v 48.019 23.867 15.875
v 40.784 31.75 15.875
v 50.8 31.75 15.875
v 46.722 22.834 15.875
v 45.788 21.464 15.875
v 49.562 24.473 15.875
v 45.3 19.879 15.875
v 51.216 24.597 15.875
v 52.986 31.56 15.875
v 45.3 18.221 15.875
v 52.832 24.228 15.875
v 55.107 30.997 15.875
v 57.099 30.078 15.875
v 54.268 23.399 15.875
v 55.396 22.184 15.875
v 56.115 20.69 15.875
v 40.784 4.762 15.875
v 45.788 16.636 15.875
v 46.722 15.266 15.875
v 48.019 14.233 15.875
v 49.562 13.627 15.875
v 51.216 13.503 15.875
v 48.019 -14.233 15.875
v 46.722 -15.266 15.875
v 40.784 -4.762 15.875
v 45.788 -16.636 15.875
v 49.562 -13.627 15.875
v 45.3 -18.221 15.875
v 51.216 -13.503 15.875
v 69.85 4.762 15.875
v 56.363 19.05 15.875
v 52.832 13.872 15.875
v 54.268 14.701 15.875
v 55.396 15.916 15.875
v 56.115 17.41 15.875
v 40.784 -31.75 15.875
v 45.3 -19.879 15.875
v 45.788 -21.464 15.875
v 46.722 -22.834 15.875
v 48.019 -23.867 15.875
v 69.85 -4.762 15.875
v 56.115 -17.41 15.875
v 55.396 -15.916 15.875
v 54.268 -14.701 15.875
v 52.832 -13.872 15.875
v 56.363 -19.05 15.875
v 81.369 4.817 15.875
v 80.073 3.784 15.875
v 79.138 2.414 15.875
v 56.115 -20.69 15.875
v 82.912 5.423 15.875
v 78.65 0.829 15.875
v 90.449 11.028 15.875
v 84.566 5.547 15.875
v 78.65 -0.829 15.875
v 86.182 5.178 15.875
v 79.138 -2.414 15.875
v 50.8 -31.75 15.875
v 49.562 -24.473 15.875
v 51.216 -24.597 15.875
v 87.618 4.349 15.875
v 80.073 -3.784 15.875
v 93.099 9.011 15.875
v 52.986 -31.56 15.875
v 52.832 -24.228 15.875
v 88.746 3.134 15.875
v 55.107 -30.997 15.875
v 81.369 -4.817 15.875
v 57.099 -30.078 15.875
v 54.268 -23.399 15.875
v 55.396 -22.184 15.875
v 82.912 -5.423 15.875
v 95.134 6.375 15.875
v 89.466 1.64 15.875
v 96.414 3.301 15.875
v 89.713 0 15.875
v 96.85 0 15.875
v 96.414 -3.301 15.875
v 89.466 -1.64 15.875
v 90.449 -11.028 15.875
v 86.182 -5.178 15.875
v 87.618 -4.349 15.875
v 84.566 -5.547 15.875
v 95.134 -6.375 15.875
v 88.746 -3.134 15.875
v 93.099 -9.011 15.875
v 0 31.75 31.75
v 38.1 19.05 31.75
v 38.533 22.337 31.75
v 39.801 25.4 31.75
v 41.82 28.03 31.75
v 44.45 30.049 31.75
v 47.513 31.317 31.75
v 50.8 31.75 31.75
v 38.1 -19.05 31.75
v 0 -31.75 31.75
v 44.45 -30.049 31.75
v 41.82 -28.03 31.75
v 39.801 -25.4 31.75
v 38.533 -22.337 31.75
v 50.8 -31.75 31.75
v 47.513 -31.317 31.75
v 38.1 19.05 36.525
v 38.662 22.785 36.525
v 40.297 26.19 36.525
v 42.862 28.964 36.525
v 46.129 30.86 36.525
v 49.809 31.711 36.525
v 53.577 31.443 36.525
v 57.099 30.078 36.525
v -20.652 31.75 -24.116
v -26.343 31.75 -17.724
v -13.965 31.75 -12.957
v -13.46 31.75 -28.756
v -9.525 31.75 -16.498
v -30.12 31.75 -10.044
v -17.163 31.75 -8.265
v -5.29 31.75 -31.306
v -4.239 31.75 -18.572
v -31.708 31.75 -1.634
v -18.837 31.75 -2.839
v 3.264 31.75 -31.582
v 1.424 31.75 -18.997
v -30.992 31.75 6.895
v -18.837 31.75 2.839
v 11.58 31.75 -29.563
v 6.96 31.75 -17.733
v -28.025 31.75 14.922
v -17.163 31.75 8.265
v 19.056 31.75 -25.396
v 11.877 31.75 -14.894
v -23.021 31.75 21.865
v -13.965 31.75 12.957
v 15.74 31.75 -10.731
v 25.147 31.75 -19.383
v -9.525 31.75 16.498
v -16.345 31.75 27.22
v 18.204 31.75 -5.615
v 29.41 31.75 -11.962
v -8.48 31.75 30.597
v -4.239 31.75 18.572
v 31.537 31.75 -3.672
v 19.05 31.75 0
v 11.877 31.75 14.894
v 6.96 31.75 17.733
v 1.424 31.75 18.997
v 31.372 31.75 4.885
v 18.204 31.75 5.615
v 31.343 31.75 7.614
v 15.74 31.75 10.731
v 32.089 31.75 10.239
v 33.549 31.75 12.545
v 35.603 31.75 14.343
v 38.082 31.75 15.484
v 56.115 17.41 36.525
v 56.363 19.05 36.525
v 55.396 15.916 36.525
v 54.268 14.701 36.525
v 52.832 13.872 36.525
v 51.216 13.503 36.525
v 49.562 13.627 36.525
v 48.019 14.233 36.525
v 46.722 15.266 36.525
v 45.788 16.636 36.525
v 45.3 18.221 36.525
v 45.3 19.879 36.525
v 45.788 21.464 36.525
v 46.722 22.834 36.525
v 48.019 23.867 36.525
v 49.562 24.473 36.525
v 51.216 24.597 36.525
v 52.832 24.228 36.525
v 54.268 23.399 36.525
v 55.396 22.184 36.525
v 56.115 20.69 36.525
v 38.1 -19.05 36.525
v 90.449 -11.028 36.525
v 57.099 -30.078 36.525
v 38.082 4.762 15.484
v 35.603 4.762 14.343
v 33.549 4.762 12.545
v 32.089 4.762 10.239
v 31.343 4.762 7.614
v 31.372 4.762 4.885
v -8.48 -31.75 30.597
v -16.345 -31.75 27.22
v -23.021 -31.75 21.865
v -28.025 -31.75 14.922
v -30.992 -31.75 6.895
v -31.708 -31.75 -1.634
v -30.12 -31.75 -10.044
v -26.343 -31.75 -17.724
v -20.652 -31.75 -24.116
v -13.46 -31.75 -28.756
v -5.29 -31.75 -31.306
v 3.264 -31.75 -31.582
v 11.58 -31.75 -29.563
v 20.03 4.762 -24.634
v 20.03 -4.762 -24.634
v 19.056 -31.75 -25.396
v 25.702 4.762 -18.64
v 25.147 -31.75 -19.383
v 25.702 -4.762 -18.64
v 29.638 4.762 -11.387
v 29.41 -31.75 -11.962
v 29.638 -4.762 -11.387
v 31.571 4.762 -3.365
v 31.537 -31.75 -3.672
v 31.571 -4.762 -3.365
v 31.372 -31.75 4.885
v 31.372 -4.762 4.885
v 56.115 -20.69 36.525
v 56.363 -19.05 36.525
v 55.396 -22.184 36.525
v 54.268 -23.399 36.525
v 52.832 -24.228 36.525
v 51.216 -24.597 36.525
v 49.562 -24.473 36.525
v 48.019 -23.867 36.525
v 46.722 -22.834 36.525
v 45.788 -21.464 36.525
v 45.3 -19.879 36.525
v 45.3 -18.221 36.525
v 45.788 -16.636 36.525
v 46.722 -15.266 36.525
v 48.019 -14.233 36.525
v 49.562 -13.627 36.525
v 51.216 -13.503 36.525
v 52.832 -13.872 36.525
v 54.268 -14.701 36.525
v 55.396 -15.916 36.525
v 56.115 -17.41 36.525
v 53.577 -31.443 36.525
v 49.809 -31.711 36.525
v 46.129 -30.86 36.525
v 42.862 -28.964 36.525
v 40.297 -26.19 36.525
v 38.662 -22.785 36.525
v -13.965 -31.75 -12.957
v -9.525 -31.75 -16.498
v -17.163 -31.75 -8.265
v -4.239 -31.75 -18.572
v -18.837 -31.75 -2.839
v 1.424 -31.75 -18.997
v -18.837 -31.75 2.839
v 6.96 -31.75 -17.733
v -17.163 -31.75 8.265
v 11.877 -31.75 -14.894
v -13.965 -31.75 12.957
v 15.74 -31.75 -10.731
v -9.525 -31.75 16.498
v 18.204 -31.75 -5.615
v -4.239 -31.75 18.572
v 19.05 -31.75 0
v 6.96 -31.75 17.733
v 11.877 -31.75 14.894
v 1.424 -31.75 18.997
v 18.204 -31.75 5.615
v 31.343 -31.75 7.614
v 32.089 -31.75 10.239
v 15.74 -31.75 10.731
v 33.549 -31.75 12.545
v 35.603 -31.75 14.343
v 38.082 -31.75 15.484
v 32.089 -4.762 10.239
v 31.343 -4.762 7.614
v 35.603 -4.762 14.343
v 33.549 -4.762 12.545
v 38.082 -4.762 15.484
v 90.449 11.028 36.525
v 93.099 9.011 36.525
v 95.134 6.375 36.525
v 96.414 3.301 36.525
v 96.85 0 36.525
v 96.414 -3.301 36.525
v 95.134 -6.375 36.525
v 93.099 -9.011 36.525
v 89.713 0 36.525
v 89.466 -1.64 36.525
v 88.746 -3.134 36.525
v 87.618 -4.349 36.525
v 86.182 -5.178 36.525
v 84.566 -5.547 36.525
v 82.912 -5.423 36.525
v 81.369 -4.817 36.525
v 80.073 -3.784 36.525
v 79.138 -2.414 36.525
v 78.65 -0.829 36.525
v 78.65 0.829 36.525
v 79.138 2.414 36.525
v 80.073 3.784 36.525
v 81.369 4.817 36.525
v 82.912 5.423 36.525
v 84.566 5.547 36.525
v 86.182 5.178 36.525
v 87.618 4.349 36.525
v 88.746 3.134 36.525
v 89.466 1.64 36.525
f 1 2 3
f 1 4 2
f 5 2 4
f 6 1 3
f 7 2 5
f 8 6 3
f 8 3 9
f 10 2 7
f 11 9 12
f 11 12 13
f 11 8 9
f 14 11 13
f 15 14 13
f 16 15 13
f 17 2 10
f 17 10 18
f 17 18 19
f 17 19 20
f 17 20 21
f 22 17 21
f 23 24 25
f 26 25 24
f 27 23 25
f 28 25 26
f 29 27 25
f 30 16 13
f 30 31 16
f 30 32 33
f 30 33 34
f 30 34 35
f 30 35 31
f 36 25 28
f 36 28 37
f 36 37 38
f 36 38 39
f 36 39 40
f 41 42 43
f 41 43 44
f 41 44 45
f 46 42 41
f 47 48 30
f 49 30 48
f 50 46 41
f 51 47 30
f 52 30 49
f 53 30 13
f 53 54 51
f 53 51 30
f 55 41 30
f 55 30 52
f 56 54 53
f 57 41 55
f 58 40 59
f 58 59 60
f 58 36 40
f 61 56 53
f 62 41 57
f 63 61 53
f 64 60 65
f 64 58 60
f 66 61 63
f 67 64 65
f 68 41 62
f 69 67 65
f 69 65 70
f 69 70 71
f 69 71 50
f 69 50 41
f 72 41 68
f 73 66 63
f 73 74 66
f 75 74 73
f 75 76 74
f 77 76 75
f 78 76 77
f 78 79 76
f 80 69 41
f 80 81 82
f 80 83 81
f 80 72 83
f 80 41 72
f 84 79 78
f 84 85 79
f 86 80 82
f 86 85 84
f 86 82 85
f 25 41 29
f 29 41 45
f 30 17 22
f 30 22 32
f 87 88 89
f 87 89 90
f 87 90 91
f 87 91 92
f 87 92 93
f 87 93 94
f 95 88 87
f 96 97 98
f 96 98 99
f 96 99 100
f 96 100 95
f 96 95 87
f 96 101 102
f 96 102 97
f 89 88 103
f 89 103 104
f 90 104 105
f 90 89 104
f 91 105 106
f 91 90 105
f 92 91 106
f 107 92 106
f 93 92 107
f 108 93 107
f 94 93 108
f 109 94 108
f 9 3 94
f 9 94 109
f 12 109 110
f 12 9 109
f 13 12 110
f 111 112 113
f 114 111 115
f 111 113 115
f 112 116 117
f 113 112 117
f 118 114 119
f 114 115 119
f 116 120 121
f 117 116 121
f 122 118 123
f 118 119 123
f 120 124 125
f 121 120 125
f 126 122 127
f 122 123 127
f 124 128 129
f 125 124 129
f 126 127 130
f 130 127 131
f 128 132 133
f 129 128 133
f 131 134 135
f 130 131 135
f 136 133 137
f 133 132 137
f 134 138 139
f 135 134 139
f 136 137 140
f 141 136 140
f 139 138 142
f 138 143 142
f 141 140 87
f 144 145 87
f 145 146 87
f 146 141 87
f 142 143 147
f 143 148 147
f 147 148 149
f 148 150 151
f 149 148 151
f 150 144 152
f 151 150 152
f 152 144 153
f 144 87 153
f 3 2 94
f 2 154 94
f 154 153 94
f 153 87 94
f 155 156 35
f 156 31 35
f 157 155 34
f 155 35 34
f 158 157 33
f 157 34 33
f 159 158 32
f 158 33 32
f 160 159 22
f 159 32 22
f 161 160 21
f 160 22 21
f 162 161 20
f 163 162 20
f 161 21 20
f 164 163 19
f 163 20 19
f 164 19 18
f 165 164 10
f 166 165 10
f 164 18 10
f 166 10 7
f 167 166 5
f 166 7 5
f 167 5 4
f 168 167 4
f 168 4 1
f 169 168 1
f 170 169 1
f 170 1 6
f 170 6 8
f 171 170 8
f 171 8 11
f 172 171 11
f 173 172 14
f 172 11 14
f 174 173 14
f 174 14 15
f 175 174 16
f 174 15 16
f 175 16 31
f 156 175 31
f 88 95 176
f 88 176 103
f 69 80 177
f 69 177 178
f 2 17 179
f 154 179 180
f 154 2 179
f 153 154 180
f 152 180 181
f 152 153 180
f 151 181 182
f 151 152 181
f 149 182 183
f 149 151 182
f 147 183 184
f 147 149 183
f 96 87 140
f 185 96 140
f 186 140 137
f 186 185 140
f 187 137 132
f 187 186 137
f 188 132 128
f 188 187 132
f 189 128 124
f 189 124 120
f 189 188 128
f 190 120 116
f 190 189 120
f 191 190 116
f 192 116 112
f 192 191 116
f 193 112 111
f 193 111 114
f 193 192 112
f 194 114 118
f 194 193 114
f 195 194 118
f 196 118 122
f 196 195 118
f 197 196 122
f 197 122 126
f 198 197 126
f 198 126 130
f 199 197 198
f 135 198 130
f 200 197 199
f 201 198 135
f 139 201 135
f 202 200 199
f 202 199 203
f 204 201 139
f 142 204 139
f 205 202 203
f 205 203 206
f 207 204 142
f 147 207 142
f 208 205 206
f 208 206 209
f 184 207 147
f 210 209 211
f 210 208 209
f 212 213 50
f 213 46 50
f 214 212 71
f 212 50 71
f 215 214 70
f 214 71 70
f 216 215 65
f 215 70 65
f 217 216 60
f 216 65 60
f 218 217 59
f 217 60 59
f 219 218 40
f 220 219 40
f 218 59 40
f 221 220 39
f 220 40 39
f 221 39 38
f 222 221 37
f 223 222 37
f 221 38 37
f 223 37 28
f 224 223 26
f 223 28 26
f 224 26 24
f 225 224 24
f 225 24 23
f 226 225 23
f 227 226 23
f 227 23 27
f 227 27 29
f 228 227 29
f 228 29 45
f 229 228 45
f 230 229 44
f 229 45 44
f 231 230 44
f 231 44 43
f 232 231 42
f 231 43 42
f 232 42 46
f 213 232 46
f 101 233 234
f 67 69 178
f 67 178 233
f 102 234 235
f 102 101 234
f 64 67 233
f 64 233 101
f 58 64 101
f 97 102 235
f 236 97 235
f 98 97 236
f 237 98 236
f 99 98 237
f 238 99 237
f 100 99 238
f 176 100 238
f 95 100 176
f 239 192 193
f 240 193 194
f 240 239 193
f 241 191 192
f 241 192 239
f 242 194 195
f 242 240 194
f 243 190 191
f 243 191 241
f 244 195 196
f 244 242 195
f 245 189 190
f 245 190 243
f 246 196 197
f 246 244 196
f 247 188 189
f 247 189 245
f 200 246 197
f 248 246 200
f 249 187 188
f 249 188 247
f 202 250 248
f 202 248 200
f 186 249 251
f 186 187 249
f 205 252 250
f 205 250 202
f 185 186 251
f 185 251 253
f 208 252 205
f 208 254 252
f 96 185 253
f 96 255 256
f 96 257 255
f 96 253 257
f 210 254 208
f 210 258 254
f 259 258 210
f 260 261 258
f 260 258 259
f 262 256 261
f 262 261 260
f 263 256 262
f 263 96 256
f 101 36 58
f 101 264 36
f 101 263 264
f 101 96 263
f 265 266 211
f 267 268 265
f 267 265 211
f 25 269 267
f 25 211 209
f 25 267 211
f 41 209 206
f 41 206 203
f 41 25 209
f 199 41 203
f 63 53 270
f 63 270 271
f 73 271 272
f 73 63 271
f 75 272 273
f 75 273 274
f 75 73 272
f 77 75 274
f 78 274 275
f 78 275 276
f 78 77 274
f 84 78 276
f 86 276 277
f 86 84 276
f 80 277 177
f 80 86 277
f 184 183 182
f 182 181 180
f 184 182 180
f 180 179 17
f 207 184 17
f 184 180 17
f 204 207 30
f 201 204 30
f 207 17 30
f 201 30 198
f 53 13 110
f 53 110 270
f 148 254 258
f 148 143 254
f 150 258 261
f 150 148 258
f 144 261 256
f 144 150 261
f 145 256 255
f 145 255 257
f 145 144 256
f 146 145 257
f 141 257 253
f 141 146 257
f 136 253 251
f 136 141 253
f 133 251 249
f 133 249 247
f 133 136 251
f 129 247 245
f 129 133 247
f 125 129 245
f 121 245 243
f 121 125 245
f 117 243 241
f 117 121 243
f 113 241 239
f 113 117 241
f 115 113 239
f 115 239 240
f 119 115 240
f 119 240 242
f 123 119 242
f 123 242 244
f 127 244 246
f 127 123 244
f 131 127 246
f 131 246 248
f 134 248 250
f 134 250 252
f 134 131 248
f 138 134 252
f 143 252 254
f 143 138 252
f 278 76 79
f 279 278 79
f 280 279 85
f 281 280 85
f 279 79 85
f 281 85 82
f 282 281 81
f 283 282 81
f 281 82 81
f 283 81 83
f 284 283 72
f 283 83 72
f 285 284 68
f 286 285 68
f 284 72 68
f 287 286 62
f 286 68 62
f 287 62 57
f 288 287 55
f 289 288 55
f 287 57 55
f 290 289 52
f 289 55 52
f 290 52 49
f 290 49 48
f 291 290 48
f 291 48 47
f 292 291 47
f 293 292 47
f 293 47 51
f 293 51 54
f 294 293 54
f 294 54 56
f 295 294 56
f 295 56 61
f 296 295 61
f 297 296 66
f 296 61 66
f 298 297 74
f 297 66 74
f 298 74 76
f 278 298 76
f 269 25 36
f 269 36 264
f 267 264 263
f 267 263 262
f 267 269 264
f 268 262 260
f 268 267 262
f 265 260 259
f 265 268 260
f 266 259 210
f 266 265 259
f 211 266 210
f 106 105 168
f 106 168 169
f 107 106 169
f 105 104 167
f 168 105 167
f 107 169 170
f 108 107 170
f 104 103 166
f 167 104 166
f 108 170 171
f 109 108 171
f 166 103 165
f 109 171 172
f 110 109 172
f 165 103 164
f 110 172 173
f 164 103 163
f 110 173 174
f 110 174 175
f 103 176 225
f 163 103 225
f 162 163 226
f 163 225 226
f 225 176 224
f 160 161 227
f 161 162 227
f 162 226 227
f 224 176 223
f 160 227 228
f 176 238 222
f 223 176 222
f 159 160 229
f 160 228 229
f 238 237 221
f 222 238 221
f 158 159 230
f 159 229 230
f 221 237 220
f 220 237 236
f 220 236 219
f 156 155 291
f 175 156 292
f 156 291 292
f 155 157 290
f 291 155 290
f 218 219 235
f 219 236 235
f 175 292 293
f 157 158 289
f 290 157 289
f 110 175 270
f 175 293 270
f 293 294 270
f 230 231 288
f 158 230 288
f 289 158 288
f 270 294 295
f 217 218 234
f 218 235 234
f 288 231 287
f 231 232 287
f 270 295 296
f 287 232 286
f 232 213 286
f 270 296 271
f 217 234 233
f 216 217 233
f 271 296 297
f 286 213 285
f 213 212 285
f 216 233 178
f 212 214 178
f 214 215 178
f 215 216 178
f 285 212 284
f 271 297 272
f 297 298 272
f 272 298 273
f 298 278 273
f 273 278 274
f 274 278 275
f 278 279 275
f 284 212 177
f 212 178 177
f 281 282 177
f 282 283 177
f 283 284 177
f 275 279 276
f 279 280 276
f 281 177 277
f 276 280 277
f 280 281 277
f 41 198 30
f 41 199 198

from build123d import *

# Parameters (mm, degrees)
F0_R     = 19.05
F1_DEPTH = 31.75
F2_R     = 5.5626
F3_DEPTH = 20.6502
F4_R     = 9.525
F6_DEPTH = 4.7625
F7_R     = 5.5626
F8_DEPTH = 68.2762


with BuildPart() as f1:
    # F0 (on Front) → F1 (new body, symmetric)
    with BuildSketch(Plane.XZ):
        with BuildLine():
            ThreePointArc((0, 31.75), (-22.4506403027, -22.4506403027), (31.75, 0))
            ThreePointArc((31.75, 0), (30.6681449847, 8.217504682), (27.4963065702, 15.875))
            ThreePointArc((27.4963065702, 15.875), (15.875, 27.4963065702), (0, 31.75))
        make_face()
        Circle(F0_R, mode=Mode.SUBTRACT)
        with BuildLine():
            ThreePointArc((0, 31.75), (15.875, 27.4963065702), (27.4963065702, 15.875))
            Line((27.4963065702, 15.875), (50.8, 15.875))
            Line((50.8, 15.875), (50.8, 31.75))
            Line((50.8, 31.75), (0, 31.75))
        make_face()
    extrude(amount=F1_DEPTH, both=True)

    # F2 (on face) → F3 (join)
    with BuildSketch(Plane(origin=(0, 0, 15.875), x_dir=(1, 0, 0), z_dir=(0, 0, -1))):
        with BuildLine():
            Line((90.4493554441, 11.0277214642), (57.0991554441, 30.0777214642))
            ThreePointArc((57.0991554441, 30.0777214642), (44.4246284085, 30.0338352623), (38.1, 19.05))
            Line((38.1, 19.05), (38.1, -19.05))
            ThreePointArc((38.1, -19.05), (44.4246284085, -30.0338352623), (57.0991554441, -30.0777214642))
            Line((57.0991554441, -30.0777214642), (90.4493554441, -11.0277214642))
            ThreePointArc((90.4493554441, -11.0277214642), (96.8502, 0), (90.4493554441, 11.0277214642))
        make_face()
        with Locations((50.8, -19.05)):
            Circle(F2_R, mode=Mode.SUBTRACT)
        with Locations((84.1502, 0)):
            Circle(F2_R, mode=Mode.SUBTRACT)
        with Locations((50.8, 19.05)):
            Circle(F2_R, mode=Mode.SUBTRACT)
    extrude(amount=-F3_DEPTH)

    # F4
    f4_edges = [f1.edges().sort_by_distance(p)[0] for p in [
        (27.496307, 0, 15.875),
    ]]
    fillet(f4_edges, radius=F4_R)

    # F5 (on Front) → F6 (join, symmetric)
    with BuildSketch(Plane.XZ):
        with BuildLine():
            Line((20.0304912791, -24.6341616281), (69.85, 15.875))
            Line((69.85, 15.875), (57.0991554441, 15.875))
            Line((57.0991554441, 15.875), (50.8, 15.875))
            Line((50.8, 15.875), (40.7836134373, 15.875))
            ThreePointArc((40.7836134373, 15.875), (33.5488565837, 12.545475629), (31.3720103364, 4.8846153846))
            ThreePointArc((31.3720103364, 4.8846153846), (29.6377097996, -11.3872146654), (20.0304912791, -24.6341616281))
        make_face()
    extrude(amount=F6_DEPTH, both=True)

    # F7 (on face) → F8 (cut, through all)
    with BuildSketch(Plane.XY.offset(36.5252)):
        with Locations((50.8, 19.05)):
            Circle(F7_R)
        with Locations((50.8, -19.05)):
            Circle(F7_R)
    extrude(amount=-F8_DEPTH, mode=Mode.SUBTRACT)


solid = f1.part
